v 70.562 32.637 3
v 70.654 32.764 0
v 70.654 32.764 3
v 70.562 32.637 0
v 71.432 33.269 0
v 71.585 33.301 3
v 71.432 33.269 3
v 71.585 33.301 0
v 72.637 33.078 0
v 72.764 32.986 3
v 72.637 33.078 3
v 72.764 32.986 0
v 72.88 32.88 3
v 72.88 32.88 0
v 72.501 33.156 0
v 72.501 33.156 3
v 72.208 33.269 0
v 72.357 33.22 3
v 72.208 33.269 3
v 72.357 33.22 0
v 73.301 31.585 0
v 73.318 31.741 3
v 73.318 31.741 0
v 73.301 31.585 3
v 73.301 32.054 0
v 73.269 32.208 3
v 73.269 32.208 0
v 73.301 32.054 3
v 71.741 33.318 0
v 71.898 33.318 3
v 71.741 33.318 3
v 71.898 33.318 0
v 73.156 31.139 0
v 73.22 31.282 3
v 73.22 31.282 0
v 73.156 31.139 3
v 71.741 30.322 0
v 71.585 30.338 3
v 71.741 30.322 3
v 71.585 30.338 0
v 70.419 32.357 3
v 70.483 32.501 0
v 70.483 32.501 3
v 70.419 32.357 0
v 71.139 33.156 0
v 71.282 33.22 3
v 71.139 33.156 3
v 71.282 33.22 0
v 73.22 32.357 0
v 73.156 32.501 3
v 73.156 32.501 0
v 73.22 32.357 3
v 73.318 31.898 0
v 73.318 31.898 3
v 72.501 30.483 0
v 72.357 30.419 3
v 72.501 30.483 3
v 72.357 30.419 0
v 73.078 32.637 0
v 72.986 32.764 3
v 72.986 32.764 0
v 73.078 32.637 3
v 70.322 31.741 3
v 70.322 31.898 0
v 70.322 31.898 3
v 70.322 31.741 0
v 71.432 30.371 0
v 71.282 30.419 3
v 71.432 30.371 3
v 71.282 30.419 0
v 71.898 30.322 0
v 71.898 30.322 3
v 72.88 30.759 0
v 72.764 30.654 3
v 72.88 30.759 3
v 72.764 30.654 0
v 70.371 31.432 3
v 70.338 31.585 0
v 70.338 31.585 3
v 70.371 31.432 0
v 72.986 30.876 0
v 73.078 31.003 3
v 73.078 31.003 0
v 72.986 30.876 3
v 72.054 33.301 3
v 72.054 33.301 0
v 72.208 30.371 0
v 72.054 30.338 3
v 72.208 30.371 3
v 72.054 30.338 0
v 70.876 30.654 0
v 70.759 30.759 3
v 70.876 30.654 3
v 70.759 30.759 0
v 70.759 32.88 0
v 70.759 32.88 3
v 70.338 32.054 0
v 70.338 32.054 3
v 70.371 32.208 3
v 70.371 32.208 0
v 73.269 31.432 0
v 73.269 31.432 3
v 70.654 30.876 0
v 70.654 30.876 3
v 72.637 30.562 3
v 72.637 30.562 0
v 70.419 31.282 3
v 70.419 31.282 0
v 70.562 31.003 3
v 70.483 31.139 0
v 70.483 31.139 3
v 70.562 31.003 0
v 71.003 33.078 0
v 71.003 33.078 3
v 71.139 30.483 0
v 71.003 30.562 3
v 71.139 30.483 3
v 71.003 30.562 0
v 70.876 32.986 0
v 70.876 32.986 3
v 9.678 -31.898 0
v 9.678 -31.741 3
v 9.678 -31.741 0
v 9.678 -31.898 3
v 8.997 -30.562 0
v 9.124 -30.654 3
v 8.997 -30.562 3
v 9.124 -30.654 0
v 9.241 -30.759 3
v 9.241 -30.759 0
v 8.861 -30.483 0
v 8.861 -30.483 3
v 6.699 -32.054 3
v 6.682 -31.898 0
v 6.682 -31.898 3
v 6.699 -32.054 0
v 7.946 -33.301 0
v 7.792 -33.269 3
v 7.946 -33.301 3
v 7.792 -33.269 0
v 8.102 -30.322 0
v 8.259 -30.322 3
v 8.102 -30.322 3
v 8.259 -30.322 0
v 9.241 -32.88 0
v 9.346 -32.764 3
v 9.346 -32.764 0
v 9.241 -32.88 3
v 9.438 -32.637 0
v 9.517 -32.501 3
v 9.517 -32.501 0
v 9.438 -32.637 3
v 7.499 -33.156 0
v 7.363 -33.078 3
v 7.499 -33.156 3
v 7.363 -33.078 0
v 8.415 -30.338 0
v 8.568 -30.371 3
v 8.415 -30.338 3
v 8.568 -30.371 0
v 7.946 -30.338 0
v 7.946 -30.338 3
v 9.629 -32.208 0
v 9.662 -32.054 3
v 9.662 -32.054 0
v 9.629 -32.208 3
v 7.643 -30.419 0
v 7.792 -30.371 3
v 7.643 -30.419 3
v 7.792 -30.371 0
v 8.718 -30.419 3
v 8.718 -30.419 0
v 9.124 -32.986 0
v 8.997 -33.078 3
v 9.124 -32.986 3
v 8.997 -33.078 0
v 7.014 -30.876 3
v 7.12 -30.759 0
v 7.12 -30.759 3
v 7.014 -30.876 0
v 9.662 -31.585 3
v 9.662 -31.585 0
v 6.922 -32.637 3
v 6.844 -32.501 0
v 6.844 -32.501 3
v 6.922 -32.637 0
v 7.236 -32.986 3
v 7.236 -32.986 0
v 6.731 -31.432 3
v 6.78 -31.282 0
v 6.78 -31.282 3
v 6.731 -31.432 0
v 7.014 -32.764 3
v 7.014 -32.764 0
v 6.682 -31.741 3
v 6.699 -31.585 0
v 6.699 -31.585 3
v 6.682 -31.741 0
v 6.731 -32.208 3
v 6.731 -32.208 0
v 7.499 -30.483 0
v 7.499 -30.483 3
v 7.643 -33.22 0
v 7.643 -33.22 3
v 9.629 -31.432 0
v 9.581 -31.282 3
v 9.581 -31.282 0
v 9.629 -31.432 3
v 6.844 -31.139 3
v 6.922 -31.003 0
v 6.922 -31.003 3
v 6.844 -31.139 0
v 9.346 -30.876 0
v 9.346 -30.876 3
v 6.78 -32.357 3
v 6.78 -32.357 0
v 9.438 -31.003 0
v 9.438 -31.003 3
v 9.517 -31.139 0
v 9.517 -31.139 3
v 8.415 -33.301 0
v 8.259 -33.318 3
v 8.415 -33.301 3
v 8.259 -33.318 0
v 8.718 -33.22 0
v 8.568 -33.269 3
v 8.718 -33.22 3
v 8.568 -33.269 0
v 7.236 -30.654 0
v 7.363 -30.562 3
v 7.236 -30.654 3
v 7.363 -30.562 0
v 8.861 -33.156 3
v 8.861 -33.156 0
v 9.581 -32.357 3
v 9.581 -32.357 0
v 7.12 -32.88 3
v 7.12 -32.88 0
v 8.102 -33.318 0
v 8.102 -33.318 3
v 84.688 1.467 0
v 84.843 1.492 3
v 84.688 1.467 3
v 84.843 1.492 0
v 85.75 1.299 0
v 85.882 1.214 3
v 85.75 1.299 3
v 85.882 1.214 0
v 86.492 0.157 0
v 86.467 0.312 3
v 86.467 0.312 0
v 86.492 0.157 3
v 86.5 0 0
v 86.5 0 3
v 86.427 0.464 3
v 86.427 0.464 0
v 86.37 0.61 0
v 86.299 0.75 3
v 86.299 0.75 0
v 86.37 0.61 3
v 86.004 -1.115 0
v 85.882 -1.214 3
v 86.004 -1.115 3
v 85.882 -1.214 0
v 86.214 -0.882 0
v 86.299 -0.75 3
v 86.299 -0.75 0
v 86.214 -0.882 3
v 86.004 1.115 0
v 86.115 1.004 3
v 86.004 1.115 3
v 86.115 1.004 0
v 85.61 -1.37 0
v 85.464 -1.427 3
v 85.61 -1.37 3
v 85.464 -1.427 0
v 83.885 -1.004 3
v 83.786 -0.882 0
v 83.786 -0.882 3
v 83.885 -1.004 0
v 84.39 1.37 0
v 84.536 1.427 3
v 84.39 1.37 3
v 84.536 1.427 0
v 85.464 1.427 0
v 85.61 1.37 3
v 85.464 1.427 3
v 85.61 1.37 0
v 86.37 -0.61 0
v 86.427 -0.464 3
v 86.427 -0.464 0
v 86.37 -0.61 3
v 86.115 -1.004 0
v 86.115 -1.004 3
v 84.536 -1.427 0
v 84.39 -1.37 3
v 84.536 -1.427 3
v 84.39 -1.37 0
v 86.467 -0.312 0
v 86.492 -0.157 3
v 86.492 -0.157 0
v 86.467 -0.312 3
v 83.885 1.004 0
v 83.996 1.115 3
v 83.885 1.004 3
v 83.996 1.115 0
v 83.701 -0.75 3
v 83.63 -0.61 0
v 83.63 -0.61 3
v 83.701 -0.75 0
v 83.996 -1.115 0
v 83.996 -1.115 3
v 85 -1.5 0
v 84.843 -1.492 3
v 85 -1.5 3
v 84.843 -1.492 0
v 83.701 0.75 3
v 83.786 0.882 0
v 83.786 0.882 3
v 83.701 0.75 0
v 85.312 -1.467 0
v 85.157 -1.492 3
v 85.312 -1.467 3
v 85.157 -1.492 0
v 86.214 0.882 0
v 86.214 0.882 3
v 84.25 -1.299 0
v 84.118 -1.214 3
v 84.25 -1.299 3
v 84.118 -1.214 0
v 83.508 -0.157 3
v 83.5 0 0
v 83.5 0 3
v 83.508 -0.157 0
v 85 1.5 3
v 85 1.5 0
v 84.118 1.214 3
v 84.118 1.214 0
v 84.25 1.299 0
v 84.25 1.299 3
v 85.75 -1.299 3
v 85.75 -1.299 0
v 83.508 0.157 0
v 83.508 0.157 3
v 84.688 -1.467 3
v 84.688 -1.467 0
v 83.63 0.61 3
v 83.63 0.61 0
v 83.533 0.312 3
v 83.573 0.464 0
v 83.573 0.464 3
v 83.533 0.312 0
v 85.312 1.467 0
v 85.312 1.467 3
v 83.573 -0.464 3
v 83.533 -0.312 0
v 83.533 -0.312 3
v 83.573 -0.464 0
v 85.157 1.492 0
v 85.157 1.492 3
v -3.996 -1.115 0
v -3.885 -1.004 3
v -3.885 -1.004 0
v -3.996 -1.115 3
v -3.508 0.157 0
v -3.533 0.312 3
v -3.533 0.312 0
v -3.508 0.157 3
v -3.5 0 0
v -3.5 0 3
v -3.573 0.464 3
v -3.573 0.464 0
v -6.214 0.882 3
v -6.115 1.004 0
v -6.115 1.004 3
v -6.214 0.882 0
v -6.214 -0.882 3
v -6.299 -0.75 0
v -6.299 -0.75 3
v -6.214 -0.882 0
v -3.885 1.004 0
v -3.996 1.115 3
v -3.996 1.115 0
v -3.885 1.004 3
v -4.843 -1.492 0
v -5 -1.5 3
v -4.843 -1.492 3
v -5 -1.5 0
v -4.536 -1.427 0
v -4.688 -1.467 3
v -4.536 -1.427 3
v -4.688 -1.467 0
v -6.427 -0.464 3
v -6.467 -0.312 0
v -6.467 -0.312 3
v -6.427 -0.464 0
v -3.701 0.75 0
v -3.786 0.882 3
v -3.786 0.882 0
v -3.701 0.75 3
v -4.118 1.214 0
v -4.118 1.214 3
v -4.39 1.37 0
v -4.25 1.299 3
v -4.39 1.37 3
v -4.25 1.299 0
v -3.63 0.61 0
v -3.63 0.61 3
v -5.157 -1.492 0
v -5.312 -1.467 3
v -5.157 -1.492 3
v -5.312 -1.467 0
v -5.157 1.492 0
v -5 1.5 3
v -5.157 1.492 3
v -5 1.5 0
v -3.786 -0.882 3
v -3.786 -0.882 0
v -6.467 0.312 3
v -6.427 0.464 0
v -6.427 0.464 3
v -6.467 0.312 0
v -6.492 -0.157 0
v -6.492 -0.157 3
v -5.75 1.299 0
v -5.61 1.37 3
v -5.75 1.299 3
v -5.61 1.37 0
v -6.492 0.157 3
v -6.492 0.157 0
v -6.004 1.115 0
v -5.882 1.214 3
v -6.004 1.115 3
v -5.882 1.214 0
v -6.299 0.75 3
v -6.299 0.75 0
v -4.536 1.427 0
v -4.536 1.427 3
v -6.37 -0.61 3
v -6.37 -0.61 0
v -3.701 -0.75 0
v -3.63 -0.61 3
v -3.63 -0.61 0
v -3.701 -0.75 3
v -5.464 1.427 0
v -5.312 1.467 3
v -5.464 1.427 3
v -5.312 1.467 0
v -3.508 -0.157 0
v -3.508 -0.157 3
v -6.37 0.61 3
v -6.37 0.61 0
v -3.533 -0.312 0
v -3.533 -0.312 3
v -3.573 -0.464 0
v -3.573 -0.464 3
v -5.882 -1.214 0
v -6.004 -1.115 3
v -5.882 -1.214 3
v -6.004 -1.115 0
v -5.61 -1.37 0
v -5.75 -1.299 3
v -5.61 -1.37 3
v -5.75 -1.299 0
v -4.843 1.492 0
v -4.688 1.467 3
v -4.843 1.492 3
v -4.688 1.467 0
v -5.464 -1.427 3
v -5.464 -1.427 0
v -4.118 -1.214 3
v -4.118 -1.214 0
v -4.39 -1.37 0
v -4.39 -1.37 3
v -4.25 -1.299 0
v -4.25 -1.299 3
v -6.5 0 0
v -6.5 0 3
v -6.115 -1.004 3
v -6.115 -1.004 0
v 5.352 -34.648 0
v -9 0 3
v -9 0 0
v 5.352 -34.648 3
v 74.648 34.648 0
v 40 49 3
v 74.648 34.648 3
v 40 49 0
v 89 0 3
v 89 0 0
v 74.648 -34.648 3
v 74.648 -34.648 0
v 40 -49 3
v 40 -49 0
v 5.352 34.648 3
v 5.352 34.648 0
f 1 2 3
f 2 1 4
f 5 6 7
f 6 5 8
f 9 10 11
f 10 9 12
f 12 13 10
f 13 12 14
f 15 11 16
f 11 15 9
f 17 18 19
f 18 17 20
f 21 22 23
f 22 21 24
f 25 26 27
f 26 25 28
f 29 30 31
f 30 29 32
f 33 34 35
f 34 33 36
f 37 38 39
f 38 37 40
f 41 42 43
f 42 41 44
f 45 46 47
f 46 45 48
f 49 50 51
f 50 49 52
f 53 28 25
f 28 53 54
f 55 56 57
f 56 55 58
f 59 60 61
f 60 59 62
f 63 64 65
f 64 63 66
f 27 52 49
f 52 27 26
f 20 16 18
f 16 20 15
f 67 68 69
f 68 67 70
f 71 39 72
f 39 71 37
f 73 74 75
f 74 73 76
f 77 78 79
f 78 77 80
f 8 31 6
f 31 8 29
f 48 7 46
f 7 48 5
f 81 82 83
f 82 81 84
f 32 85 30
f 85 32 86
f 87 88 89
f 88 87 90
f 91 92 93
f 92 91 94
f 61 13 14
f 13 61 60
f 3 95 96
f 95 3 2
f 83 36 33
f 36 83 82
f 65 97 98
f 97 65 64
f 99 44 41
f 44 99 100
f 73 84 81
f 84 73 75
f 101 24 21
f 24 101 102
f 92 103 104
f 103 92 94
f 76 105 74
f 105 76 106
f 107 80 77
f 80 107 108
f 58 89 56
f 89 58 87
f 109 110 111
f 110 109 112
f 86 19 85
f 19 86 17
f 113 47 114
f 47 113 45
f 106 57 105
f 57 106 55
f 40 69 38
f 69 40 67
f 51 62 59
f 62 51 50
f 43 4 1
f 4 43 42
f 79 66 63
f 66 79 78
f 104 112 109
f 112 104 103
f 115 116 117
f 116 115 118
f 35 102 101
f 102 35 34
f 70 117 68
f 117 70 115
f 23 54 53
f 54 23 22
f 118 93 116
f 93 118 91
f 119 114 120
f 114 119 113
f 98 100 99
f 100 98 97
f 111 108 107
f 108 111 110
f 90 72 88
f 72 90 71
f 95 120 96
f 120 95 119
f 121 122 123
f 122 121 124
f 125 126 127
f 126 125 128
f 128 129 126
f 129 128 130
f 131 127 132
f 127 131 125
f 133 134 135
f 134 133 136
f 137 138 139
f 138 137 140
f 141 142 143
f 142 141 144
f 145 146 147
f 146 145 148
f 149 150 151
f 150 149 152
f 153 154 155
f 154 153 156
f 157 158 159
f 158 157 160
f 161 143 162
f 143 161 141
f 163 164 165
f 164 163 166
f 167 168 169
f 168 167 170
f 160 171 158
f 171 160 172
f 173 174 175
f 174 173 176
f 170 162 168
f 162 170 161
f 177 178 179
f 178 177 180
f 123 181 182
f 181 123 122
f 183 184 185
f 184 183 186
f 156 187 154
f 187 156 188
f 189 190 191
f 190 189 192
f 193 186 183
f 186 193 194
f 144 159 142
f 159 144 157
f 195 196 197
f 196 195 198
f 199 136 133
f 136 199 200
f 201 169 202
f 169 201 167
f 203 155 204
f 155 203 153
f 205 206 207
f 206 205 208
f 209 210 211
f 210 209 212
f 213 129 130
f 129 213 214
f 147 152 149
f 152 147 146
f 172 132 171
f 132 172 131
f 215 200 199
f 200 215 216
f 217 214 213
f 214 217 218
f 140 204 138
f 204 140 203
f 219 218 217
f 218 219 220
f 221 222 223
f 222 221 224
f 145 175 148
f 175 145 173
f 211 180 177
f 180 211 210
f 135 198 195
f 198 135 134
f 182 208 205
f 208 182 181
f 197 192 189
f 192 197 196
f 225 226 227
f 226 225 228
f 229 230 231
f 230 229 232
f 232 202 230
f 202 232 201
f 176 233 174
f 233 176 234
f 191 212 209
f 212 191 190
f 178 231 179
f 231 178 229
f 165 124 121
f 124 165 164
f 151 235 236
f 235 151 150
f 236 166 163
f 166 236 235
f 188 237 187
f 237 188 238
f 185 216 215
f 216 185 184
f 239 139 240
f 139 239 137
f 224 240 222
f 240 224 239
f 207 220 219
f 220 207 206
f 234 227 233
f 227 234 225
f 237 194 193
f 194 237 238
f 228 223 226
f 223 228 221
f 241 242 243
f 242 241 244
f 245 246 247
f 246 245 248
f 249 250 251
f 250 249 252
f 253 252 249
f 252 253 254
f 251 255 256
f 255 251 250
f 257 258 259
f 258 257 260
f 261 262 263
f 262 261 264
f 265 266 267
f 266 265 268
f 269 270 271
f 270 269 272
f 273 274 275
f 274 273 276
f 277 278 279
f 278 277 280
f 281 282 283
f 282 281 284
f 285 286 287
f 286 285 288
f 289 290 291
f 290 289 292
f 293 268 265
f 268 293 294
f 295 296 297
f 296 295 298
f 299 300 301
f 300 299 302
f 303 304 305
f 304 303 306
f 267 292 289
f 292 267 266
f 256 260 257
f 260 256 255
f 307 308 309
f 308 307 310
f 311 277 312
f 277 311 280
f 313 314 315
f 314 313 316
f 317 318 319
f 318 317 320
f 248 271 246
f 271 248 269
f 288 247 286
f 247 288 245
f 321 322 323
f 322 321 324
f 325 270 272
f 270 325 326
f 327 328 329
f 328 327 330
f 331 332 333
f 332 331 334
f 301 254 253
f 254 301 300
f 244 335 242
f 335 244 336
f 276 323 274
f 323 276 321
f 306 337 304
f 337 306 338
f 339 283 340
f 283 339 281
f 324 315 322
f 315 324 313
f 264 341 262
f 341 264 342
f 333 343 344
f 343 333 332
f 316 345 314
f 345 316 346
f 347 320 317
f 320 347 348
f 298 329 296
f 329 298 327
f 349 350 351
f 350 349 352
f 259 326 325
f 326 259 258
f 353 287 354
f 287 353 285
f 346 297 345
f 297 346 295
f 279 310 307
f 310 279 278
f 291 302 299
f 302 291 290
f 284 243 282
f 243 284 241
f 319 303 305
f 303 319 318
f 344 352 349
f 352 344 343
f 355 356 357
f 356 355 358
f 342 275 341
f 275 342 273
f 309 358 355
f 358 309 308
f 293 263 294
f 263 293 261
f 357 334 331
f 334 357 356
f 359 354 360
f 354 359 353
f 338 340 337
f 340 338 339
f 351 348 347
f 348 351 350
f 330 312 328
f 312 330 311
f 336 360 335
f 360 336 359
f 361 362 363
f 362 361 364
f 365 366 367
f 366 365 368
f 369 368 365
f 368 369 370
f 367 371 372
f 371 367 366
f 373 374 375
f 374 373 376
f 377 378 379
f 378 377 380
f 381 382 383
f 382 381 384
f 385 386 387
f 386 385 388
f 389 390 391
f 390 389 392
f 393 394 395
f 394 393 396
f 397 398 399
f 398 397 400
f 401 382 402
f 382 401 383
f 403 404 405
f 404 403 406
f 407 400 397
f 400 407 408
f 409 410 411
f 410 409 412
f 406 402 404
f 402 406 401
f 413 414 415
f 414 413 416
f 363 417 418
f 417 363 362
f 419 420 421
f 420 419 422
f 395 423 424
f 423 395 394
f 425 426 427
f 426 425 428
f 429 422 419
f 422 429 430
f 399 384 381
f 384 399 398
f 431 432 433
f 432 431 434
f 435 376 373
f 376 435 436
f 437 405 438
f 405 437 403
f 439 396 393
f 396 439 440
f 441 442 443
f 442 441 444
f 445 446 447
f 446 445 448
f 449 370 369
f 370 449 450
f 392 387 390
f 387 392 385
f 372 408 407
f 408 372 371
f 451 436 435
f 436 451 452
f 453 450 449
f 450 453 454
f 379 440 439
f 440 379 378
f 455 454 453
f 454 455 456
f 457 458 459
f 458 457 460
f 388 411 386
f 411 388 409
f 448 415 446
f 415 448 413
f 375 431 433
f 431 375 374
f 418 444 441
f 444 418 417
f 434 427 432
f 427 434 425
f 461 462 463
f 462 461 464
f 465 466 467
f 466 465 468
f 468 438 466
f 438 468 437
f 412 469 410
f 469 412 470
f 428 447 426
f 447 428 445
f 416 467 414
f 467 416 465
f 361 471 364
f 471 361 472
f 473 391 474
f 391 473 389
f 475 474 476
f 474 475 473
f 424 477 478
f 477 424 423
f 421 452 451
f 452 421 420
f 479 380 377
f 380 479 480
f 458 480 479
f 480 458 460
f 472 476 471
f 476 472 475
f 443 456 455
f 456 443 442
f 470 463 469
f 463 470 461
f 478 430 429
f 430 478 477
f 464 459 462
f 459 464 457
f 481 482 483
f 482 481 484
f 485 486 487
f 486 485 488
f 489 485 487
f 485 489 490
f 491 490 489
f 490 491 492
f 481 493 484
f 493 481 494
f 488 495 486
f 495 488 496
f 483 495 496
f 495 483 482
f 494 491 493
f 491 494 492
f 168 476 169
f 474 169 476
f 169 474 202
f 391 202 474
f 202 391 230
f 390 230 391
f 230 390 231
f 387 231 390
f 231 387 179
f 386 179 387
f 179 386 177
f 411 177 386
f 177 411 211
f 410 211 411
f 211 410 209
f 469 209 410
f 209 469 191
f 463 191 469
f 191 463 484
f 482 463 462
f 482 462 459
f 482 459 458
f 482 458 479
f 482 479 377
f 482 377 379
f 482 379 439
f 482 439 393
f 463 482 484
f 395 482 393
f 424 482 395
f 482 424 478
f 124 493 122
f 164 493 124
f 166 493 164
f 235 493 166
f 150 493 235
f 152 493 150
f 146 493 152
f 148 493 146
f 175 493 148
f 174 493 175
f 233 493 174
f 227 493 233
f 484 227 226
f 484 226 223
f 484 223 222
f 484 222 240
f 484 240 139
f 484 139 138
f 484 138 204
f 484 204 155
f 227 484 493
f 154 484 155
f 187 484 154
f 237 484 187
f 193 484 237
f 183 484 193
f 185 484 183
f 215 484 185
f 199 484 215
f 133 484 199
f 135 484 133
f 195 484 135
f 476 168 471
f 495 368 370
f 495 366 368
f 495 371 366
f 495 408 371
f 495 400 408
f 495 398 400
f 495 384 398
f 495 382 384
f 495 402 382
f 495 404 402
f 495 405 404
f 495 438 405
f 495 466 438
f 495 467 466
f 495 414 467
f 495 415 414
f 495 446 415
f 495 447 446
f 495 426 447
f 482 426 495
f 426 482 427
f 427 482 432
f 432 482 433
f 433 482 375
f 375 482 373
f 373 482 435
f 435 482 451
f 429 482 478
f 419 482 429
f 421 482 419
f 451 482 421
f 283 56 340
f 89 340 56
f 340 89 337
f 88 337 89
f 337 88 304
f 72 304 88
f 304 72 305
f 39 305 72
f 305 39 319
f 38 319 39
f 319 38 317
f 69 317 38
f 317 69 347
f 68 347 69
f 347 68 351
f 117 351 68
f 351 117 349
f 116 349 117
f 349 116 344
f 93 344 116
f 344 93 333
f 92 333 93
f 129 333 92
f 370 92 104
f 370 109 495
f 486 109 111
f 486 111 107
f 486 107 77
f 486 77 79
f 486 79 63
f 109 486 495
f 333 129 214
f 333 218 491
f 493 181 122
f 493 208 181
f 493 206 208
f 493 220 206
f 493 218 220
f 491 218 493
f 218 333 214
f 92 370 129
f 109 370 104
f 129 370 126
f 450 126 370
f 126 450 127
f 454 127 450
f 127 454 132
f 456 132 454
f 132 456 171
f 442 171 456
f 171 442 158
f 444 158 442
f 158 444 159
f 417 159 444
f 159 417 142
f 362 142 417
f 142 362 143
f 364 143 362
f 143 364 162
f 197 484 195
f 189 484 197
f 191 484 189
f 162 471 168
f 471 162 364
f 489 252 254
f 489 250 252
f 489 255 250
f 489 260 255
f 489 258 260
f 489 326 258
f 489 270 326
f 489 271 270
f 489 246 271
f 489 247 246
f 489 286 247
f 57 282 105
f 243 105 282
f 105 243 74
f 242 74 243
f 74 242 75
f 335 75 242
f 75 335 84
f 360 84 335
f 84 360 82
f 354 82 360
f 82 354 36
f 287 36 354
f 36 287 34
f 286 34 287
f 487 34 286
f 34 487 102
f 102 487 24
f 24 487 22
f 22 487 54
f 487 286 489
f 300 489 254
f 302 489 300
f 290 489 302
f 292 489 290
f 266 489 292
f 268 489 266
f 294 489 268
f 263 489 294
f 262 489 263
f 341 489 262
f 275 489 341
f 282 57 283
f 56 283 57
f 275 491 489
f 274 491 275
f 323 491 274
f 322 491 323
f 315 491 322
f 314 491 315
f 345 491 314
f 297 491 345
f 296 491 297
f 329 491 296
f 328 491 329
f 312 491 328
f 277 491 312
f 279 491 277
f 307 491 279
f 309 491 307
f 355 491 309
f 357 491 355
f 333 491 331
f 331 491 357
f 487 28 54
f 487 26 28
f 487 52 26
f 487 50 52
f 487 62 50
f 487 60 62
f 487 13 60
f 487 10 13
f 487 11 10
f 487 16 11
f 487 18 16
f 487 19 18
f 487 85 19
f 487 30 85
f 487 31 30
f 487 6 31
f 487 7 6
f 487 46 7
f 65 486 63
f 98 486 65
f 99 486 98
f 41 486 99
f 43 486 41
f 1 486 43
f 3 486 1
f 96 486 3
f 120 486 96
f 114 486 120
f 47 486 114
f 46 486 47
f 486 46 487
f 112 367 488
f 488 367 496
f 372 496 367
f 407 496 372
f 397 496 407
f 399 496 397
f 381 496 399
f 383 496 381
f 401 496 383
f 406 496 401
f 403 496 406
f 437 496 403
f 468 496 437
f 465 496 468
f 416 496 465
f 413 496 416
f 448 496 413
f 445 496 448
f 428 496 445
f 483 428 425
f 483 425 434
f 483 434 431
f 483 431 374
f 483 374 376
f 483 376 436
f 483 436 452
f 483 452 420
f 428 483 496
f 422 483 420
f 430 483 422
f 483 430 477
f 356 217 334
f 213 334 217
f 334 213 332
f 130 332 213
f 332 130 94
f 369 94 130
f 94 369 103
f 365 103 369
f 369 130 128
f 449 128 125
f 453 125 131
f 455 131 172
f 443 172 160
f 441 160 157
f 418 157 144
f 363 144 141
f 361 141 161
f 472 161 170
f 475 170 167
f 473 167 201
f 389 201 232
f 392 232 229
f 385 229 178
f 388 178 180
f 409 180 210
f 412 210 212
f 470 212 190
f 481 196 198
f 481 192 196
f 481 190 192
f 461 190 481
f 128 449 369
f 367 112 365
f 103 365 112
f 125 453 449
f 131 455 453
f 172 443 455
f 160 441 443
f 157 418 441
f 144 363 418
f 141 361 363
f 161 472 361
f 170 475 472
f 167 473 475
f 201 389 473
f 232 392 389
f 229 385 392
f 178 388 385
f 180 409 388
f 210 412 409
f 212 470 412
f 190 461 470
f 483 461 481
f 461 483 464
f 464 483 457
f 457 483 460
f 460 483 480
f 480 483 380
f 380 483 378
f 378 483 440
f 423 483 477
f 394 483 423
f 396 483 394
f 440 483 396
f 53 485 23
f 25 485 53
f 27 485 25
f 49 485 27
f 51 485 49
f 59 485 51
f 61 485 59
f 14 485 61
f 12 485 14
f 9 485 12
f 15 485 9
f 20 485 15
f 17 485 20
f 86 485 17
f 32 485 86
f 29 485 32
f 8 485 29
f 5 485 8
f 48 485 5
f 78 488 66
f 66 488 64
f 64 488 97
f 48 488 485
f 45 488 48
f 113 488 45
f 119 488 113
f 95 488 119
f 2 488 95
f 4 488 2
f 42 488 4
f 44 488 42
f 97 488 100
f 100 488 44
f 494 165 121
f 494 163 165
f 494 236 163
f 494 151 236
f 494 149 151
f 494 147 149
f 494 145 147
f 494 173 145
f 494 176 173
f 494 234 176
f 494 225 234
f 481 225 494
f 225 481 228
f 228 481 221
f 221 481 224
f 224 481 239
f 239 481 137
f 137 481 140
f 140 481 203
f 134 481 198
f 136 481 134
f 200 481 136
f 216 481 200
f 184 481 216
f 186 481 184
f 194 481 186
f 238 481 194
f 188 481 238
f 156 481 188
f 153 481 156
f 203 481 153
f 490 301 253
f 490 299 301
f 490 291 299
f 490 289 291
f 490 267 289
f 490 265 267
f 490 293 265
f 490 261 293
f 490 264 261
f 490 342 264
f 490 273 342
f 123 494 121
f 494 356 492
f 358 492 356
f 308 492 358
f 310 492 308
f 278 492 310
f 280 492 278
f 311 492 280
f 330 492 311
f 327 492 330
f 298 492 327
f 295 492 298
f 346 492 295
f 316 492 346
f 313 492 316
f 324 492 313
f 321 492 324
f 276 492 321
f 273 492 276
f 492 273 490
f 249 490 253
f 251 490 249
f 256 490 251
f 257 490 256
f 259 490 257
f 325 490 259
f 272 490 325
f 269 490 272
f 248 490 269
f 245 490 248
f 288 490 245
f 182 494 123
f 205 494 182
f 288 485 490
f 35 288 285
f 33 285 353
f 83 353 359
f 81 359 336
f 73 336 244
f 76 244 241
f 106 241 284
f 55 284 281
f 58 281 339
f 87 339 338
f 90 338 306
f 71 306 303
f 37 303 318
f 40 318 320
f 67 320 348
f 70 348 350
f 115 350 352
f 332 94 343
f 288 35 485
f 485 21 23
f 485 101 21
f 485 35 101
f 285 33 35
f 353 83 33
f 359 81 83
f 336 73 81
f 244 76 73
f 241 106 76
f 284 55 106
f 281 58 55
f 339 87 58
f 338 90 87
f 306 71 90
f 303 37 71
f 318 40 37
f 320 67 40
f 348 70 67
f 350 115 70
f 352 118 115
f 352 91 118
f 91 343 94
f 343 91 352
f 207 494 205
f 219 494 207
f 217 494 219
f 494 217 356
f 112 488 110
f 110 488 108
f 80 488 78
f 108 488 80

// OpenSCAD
//*****************************cover on top********************//
    $fn=8;
translate([-60,0,0]){
translate([100,0,0])color("LightSalmon")difference()
{

    cylinder(h=3,r=49);
    
translate([0,0,-2])color("PaleTurquoise"){  
    difference(){
   
        translate([45,0,0])cylinder(h=40, r=1.5,$fn=60);
    }   
    difference(){    
        
        translate([-45,0,0])cylinder(h=40, r=1.5,$fn=60);
    }
        
rotate([0,0,45]){    
    
    difference(){
       
        translate([45,0,0])cylinder(h=40, r=1.5,$fn=60);
    }
    
    difference(){
    
        translate([-45,0,0])cylinder(h=40, r=1.5,$fn=60);
    }
    

}
    
    
}
}
//*****************************logo*****************************//

rotate([0,0,22.6]){translate([64,-70,3])scale([0.07,0.07,0.2])linear_extrude(height=5)
    
    import("/Users/incubation/Downloads/nightowl-logo-only_no_network (1).dxf",convexity=60);
    scale([0.5,0.5,4])translate([155,-25,0.6])text("Night Owl",font="Hobo std",$fn=60);
    rotate([0,0,22.6])translate([64.7,-70,2])cylinder(h=2, r=1.5,$fn=60);
    rotate([0,0,22.6])translate([74,-74,2])cylinder(h=2, r=1.5,$fn=60);
}
}
 
